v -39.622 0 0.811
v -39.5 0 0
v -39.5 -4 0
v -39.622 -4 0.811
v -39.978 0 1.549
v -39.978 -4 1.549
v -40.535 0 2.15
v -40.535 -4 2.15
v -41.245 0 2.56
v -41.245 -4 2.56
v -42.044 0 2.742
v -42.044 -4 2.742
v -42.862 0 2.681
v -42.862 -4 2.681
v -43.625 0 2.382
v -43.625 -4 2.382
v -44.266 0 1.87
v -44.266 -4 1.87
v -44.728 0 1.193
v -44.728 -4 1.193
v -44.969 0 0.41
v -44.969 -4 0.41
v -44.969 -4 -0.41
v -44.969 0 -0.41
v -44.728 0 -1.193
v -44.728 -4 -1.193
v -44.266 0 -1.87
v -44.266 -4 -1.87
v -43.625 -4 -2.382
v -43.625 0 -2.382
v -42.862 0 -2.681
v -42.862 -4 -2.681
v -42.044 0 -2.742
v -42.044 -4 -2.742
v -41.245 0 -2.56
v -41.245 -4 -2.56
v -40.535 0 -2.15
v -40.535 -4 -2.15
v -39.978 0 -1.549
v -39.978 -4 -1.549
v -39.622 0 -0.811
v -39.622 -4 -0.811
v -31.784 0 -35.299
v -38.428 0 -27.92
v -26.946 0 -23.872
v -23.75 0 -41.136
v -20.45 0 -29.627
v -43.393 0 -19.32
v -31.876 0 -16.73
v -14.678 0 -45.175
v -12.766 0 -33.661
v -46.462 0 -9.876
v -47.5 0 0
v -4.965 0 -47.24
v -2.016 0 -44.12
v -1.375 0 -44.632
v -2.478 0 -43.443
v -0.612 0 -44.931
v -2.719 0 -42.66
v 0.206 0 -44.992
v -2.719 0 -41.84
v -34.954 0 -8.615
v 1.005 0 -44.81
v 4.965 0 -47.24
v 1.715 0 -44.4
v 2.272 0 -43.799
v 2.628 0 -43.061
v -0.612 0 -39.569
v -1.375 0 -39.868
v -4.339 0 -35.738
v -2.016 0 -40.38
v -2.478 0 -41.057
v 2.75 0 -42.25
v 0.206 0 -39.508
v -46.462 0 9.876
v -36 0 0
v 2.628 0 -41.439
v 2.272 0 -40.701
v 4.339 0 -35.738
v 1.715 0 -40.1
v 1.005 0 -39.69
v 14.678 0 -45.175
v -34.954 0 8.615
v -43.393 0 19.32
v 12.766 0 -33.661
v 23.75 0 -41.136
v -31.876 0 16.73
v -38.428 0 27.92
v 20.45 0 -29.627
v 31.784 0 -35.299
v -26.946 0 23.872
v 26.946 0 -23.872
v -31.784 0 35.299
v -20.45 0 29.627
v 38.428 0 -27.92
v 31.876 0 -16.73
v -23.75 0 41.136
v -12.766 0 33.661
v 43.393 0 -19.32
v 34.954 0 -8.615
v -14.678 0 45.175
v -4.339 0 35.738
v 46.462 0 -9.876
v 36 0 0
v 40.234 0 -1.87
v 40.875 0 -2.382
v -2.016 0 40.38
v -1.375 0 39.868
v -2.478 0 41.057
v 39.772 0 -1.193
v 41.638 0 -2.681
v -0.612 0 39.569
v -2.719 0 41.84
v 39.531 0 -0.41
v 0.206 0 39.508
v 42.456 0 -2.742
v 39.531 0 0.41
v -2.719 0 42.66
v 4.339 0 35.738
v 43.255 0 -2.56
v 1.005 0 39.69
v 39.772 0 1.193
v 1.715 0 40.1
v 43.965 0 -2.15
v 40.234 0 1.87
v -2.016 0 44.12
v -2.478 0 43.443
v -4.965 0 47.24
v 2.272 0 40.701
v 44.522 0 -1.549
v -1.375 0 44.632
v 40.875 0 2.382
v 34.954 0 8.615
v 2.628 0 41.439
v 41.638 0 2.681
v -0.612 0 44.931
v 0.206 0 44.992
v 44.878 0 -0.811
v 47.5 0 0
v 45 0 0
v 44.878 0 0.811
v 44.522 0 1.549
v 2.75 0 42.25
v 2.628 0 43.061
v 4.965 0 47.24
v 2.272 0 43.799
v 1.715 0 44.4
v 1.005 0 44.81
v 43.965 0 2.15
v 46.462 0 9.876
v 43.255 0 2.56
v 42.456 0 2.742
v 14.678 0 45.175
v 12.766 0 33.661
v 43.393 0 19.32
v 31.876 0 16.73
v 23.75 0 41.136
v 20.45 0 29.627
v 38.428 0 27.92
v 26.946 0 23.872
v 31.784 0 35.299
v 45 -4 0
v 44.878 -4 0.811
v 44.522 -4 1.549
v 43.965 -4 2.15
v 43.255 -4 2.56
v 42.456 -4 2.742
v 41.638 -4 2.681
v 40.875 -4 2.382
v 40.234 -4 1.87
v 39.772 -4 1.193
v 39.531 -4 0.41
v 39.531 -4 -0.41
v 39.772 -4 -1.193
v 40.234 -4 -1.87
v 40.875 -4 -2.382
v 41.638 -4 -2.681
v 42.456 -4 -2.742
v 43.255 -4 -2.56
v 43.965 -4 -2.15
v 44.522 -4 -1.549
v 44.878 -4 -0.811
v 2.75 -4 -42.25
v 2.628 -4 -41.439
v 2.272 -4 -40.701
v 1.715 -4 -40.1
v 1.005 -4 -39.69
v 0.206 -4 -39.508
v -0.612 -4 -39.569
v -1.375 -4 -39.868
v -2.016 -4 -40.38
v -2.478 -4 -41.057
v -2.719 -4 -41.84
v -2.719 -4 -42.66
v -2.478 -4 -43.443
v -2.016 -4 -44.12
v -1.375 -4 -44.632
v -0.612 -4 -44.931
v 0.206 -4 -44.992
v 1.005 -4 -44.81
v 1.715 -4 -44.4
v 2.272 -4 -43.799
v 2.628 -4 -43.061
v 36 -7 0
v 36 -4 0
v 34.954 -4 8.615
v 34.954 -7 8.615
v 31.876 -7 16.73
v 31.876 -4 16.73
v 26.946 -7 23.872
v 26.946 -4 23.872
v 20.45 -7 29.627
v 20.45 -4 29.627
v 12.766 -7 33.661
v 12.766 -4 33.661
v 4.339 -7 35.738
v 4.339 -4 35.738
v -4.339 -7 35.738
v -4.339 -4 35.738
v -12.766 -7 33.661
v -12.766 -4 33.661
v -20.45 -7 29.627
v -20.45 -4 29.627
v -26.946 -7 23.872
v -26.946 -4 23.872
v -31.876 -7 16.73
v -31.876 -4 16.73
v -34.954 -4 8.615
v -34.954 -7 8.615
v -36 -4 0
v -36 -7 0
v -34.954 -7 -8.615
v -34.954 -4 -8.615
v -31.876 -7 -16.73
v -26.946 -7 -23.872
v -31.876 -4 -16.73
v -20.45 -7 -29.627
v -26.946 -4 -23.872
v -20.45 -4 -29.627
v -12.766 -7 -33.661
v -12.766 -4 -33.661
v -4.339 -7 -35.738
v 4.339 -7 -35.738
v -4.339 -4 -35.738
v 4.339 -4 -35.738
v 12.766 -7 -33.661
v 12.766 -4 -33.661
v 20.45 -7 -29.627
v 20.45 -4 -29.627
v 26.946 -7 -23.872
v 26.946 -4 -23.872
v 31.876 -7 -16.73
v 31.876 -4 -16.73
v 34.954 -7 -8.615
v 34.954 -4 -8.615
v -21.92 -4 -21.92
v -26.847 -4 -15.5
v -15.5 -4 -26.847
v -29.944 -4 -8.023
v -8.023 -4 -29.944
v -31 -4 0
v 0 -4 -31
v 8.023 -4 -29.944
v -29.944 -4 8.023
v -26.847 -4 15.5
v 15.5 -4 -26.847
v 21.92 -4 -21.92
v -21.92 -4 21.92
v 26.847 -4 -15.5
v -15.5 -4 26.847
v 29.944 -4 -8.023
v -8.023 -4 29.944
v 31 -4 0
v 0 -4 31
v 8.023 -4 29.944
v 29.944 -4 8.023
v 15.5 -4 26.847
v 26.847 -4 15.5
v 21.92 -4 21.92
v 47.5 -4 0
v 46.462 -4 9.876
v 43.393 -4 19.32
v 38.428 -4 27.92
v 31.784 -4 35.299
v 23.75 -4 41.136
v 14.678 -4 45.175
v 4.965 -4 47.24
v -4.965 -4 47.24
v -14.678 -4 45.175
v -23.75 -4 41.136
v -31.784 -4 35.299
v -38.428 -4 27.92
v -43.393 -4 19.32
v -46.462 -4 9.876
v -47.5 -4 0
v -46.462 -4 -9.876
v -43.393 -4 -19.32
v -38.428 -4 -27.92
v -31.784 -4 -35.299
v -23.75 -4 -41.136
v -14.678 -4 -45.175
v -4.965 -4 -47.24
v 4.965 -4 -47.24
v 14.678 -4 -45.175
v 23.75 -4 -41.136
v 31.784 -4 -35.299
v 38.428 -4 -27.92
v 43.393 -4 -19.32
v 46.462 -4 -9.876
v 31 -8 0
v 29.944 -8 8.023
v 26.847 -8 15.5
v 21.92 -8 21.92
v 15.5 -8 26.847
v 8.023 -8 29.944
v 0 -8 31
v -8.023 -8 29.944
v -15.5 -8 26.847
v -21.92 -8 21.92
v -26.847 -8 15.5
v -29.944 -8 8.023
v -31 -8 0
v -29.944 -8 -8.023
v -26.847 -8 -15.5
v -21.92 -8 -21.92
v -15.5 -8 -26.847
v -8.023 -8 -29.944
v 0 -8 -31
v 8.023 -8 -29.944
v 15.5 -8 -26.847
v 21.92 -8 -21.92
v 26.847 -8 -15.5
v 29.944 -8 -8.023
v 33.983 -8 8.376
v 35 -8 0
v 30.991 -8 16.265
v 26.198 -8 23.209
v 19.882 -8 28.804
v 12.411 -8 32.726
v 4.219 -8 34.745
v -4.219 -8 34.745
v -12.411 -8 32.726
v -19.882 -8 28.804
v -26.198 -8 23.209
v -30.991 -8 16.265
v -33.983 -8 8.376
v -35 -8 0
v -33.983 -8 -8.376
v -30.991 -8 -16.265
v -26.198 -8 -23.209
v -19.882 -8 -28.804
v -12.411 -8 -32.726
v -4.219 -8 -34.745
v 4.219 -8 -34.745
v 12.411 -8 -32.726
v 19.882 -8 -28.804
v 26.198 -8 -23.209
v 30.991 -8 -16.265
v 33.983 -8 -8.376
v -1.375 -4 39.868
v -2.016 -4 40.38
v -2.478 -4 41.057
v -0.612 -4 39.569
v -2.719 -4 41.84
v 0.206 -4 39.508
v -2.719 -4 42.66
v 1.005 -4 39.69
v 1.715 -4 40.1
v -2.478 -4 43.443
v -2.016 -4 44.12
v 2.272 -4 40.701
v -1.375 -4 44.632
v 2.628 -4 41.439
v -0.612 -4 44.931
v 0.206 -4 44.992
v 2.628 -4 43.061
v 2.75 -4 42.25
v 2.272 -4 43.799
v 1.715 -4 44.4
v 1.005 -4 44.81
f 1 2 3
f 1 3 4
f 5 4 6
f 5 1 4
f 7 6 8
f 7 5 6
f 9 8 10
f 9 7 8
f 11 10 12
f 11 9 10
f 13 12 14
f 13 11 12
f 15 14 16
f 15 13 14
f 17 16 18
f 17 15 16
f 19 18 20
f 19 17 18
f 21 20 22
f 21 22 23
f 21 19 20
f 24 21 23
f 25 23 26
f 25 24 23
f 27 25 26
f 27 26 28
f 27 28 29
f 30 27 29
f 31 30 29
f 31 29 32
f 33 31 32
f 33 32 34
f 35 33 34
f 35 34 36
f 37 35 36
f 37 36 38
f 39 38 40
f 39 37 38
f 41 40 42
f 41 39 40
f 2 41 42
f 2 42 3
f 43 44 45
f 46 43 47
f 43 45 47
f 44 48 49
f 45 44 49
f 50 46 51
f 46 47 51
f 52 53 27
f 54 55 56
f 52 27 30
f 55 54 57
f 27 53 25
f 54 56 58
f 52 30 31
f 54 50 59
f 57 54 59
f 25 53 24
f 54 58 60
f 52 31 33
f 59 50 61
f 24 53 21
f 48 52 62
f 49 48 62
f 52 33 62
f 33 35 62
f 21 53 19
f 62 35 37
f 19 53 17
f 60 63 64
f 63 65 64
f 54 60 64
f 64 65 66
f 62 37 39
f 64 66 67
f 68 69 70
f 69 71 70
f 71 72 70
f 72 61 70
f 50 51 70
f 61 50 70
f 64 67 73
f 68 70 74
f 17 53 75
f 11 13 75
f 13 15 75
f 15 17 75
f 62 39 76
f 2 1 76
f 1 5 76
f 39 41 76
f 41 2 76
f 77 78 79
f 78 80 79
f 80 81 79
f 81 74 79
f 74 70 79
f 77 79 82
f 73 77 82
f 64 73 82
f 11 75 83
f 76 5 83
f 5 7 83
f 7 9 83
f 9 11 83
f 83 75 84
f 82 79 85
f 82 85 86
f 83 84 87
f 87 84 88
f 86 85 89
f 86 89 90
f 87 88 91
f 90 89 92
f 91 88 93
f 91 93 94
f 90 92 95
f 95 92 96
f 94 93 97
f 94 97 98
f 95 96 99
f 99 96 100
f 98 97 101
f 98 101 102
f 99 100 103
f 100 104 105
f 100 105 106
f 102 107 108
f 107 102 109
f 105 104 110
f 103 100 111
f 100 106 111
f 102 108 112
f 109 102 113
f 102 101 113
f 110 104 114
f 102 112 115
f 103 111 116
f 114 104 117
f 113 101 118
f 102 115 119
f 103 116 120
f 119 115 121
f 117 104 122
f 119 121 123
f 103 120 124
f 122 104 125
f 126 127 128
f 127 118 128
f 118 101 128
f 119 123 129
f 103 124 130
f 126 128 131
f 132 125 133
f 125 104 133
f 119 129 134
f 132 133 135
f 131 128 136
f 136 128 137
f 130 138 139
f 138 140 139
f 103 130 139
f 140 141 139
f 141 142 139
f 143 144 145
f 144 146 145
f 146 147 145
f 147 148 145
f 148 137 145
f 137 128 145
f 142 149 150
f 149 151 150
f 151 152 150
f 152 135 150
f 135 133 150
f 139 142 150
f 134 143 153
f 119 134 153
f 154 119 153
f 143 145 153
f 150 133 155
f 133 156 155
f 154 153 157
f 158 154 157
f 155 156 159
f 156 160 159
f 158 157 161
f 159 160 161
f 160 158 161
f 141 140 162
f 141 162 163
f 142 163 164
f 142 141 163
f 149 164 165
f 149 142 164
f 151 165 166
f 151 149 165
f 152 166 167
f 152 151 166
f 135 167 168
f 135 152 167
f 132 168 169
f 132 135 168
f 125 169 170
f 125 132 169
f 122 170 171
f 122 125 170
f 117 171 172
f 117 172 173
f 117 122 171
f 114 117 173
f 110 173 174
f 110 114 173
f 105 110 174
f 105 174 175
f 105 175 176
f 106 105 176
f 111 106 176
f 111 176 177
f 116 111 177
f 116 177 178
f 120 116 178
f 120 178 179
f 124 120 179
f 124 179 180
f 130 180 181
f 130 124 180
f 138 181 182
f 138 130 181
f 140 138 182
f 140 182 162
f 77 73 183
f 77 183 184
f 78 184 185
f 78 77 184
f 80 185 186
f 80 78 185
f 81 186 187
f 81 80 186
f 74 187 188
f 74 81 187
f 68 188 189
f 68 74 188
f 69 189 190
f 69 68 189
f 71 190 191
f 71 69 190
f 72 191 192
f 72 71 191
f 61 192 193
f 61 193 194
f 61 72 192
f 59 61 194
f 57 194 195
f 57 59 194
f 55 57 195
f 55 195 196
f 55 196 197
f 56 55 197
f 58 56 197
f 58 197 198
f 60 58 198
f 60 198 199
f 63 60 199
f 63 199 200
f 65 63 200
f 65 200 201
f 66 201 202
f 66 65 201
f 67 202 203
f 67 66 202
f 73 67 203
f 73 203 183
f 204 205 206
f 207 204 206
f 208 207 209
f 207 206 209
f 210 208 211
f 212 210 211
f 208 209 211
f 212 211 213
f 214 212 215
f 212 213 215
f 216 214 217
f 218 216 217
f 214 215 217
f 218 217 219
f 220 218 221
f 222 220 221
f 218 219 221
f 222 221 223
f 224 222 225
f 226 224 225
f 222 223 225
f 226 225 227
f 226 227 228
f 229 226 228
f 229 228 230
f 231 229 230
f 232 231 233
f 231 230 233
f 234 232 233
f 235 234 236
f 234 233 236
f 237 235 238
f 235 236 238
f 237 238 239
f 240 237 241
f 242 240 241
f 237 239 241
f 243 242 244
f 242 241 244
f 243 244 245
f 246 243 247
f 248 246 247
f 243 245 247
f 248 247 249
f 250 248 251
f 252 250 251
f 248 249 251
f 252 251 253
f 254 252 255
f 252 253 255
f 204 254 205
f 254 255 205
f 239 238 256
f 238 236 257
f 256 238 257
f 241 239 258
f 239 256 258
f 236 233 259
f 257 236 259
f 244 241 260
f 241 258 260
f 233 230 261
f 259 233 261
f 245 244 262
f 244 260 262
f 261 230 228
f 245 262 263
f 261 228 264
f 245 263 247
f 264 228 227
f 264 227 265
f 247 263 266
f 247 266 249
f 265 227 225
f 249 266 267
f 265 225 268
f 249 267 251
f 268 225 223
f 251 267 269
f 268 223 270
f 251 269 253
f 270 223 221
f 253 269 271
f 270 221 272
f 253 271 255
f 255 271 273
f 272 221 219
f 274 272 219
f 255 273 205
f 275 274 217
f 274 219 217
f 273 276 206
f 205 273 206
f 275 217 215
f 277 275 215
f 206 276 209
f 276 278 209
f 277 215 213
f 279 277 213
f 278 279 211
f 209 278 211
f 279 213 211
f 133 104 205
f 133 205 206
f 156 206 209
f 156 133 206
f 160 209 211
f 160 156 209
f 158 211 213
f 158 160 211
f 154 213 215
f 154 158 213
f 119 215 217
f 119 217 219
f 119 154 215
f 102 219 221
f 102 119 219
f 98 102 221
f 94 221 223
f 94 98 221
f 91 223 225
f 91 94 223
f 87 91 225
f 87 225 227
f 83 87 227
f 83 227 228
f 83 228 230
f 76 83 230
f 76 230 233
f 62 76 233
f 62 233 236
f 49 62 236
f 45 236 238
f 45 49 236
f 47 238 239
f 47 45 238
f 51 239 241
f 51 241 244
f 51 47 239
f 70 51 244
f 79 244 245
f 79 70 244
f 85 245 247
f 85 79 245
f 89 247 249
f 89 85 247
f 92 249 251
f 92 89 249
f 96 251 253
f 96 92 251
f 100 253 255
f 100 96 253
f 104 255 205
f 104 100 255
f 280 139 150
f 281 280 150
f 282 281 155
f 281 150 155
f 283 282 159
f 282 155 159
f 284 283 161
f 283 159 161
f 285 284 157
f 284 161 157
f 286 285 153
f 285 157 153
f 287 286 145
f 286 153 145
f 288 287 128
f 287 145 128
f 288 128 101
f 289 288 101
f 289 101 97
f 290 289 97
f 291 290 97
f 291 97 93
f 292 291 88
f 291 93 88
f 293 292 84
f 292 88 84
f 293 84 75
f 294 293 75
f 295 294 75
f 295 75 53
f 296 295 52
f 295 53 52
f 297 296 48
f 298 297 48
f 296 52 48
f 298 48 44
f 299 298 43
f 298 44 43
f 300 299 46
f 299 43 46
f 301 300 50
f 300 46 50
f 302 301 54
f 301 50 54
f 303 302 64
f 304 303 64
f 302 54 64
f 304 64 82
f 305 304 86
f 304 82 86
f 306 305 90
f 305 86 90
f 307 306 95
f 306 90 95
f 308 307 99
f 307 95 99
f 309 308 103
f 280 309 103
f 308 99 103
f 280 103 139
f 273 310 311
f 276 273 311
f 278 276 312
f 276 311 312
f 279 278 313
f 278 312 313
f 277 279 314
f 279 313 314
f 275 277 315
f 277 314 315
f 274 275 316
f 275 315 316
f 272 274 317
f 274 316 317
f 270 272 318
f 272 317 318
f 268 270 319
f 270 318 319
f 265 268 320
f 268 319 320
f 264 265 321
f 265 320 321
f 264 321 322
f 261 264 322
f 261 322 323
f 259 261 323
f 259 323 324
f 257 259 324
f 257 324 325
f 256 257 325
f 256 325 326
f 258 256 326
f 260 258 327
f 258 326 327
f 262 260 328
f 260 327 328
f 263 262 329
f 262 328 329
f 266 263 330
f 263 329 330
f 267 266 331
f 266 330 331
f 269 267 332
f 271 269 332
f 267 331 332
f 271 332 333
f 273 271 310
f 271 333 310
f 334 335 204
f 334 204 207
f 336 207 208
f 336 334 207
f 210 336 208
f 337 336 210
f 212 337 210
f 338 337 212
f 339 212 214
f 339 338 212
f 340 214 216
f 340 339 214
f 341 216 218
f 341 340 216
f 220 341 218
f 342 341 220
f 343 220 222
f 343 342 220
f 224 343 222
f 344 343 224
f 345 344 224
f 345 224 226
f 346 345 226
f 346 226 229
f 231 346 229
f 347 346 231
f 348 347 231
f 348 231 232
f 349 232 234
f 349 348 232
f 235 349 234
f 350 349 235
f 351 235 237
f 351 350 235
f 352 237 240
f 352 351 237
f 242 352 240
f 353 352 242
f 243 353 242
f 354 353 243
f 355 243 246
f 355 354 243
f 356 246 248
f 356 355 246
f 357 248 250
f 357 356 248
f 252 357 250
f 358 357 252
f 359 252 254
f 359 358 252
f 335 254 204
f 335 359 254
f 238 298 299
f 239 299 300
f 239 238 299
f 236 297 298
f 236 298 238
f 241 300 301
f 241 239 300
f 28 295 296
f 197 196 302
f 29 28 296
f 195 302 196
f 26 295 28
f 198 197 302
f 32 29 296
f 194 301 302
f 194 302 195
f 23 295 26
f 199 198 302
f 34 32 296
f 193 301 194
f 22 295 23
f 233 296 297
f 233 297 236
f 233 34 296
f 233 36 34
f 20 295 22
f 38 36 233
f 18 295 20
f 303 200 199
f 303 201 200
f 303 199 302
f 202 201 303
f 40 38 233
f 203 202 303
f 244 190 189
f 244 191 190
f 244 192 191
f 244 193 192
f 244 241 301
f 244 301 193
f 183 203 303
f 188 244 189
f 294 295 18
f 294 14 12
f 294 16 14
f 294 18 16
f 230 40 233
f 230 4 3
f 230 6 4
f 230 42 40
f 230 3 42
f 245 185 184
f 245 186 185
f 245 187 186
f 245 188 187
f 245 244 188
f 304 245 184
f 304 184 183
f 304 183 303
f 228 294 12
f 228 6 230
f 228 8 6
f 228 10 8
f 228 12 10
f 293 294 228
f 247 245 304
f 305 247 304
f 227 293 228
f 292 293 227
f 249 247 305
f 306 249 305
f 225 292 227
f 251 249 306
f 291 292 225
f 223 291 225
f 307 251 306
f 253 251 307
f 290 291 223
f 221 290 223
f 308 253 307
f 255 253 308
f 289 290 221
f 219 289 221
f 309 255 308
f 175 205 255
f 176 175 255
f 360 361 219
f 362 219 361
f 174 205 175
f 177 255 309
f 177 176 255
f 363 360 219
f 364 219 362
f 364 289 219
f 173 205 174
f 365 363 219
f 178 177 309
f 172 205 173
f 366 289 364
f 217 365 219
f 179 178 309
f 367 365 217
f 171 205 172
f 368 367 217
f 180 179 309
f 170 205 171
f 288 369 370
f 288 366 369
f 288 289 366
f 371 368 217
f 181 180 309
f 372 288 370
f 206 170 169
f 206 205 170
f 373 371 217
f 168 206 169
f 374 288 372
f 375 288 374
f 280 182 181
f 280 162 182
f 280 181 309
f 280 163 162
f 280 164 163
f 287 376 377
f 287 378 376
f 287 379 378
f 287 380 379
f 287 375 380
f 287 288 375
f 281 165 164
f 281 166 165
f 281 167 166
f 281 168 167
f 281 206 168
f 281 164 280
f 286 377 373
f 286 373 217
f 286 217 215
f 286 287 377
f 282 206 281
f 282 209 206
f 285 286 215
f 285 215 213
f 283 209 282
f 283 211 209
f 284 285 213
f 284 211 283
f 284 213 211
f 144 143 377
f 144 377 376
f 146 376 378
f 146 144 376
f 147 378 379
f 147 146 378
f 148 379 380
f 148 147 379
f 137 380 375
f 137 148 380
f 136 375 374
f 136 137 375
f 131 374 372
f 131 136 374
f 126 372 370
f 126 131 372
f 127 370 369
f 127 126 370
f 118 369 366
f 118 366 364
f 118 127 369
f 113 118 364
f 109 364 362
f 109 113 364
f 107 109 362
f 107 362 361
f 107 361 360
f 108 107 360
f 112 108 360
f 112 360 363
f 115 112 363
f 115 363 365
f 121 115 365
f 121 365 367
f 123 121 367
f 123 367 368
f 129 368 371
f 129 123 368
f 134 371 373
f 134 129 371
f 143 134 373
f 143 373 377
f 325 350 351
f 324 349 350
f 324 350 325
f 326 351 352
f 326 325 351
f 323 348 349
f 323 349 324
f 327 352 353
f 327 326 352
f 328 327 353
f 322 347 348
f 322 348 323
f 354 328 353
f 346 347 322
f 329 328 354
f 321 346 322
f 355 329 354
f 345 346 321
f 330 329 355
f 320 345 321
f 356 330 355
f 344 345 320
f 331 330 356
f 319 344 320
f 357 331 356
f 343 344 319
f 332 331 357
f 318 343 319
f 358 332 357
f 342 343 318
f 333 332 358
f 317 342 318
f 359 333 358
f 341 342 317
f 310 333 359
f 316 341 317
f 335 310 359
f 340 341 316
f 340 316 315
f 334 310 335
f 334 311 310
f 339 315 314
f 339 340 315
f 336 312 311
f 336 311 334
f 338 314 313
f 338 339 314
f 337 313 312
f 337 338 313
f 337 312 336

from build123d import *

# Parameters (mm, degrees)
F0_R     = 47.5
F0_R_2   = 2.75
F0_R_3   = 36
F1_DEPTH = 4
F2_R     = 36
F3_DEPTH = 4
F4_R     = 31
F5_DEPTH = 4
F6_SIZE  = 1


with BuildPart() as f1:
    # F0 (on Front) → F1 (new body)
    with BuildSketch(Plane.XZ):
        Circle(F0_R)
        with Locations((0, -42.25)):
            Circle(F0_R_2, mode=Mode.SUBTRACT)
        with Locations((-42.25, 0)):
            Circle(F0_R_2, mode=Mode.SUBTRACT)
        Circle(F0_R_3, mode=Mode.SUBTRACT)
        with Locations((42.25, 0)):
            Circle(F0_R_2, mode=Mode.SUBTRACT)
        with Locations((0, 42.25)):
            Circle(F0_R_2, mode=Mode.SUBTRACT)
    extrude(amount=F1_DEPTH)


with BuildPart() as f3:
    # F2 (on face) → F3 (new body)
    with BuildSketch(Plane.XZ.offset(4)):
        Circle(F2_R)
    extrude(amount=F3_DEPTH)

    # F4 (on face) → F5 (cut, through all)
    with BuildSketch(Plane.XZ.offset(8)):
        Circle(F4_R)
    extrude(amount=-F5_DEPTH, mode=Mode.SUBTRACT)

    # F6
    f6_edges = [f3.edges().sort_by_distance(p)[0] for p in [
        (-36, -8, 0),
    ]]
    chamfer(f6_edges, length=F6_SIZE)


solid = Compound([f1.part, f3.part])
